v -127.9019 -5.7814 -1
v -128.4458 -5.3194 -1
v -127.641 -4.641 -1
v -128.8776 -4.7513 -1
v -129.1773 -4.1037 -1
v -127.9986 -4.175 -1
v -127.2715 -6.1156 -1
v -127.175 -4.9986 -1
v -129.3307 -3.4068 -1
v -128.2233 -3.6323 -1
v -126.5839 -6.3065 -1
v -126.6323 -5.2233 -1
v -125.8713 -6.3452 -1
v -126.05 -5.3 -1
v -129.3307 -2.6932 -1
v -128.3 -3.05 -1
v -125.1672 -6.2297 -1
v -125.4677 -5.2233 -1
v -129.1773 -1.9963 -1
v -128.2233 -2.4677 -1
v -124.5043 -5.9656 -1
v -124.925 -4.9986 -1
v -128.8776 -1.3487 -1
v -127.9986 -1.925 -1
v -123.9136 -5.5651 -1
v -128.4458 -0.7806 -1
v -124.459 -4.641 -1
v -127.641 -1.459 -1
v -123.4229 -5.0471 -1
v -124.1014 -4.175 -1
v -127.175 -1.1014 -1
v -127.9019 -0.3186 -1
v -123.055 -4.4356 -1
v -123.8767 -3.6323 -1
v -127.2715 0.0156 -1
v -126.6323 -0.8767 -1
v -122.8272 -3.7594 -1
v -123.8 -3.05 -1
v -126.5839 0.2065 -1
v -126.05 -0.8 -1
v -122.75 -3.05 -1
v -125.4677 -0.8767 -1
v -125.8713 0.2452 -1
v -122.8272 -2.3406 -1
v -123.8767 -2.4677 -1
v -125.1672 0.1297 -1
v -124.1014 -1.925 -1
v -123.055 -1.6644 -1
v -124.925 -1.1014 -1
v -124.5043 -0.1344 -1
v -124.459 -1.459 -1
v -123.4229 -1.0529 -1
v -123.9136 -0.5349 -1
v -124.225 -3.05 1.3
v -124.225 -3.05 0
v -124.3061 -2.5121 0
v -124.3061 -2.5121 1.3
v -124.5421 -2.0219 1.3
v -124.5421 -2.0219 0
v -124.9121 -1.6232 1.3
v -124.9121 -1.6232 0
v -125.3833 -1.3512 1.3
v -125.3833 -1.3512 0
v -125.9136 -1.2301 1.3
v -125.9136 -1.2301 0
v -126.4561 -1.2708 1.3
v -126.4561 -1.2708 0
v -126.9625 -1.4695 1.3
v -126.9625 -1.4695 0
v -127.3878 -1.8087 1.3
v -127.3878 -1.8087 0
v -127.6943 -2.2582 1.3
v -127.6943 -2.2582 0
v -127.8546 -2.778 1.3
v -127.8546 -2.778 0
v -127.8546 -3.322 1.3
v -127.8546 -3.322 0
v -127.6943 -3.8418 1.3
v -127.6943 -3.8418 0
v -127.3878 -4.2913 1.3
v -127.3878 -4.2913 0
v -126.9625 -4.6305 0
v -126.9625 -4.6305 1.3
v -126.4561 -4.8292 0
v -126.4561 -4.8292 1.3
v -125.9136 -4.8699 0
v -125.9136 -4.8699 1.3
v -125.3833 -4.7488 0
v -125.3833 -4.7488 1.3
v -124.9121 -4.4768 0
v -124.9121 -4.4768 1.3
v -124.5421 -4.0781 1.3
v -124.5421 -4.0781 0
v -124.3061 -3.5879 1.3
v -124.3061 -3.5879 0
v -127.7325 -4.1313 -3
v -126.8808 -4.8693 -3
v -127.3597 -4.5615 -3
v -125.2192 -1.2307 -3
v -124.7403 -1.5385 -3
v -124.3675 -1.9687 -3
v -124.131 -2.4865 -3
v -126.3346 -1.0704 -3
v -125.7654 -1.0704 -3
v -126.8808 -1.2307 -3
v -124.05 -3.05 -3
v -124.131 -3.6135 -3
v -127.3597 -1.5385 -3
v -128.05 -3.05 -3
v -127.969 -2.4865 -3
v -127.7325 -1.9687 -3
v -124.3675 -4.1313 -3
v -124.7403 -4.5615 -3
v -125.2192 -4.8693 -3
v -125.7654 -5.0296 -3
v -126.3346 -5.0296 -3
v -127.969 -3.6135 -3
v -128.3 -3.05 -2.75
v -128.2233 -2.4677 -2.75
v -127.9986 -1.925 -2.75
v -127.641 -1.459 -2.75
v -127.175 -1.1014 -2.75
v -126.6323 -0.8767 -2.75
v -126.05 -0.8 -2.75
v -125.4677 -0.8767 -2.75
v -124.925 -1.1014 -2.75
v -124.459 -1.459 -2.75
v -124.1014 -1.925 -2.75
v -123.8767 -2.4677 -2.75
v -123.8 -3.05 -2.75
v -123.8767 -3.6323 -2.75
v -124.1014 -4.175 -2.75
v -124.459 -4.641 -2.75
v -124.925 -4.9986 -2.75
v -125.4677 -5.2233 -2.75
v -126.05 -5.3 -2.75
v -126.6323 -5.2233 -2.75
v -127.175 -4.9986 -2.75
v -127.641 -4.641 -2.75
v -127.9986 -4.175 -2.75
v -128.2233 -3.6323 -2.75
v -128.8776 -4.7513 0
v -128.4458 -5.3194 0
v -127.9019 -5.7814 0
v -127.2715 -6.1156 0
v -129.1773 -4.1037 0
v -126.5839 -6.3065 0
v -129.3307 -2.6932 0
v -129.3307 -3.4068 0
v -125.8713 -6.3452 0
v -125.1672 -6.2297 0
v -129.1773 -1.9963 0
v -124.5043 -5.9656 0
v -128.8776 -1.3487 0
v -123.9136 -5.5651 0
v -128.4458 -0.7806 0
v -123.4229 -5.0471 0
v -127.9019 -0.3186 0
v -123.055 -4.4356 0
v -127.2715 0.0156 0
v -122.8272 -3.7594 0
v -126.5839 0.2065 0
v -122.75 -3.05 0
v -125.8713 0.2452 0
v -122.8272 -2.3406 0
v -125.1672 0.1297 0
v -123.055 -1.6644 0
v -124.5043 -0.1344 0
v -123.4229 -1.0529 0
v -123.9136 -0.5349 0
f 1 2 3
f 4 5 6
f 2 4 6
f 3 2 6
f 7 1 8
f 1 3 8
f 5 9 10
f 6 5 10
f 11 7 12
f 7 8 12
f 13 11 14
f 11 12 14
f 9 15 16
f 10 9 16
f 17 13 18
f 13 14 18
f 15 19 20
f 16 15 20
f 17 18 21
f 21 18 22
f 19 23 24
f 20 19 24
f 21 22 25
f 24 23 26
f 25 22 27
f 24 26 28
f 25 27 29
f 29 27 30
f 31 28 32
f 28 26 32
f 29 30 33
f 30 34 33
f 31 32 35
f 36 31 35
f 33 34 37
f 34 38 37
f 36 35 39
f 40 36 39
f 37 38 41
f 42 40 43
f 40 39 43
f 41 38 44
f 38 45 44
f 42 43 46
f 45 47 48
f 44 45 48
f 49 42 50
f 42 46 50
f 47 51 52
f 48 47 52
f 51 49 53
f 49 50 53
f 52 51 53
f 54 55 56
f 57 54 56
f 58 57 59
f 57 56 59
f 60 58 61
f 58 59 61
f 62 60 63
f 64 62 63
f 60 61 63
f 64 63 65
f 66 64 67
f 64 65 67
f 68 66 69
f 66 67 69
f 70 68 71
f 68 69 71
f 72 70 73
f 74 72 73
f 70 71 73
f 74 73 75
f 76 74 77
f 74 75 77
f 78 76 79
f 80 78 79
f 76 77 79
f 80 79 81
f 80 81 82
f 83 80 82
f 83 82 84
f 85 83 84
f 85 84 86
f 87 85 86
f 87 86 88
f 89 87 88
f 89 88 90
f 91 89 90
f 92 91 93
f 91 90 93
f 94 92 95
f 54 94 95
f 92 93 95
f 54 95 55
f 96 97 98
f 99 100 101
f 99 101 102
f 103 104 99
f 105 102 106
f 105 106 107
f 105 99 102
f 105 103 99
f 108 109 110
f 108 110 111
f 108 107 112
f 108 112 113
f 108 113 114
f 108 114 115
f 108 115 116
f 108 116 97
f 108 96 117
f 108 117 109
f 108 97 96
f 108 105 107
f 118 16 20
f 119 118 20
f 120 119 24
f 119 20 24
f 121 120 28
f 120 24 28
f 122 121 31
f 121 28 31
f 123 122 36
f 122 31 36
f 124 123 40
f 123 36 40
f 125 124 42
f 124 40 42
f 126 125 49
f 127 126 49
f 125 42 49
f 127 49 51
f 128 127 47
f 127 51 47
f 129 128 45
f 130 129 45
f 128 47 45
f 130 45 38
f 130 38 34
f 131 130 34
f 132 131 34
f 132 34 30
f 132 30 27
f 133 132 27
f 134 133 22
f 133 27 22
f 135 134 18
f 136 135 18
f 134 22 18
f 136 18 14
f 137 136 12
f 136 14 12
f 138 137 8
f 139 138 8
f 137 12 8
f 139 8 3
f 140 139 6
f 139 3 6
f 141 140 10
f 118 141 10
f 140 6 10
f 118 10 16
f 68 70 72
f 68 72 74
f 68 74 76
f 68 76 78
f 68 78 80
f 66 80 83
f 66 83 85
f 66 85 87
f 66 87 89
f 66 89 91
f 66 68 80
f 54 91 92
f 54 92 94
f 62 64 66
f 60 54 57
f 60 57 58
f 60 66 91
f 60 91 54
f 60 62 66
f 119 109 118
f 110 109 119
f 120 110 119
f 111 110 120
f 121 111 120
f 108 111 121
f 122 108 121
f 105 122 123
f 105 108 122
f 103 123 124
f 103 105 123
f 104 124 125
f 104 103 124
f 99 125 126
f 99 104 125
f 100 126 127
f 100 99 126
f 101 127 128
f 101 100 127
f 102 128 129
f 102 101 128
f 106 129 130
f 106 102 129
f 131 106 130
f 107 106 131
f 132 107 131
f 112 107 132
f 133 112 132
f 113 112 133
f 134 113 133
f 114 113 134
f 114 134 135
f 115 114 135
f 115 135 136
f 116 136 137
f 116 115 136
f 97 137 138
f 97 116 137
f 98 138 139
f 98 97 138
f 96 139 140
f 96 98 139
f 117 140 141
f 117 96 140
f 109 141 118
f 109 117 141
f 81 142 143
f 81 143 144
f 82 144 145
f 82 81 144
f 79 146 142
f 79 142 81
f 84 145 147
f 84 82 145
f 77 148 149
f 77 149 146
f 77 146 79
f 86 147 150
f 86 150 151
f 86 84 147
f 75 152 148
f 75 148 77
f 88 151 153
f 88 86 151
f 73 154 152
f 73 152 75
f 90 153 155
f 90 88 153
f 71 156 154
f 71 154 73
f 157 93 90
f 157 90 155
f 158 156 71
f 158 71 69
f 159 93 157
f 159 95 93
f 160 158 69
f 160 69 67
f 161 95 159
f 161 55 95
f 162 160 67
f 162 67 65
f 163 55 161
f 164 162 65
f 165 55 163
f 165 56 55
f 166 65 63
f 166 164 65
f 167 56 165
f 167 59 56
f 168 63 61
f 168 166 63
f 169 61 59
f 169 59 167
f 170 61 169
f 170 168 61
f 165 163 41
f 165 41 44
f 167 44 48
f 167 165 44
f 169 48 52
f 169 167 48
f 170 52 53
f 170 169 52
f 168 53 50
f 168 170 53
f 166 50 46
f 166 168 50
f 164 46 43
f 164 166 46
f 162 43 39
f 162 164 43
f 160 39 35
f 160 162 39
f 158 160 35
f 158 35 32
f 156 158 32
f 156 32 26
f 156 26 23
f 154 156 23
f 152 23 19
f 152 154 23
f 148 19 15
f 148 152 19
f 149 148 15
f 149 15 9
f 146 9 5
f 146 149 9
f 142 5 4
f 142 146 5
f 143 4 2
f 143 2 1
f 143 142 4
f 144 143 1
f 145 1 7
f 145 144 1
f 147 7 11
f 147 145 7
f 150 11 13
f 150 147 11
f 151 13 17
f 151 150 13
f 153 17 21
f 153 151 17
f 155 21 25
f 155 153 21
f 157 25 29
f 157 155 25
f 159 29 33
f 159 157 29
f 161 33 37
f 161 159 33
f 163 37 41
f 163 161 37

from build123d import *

# Parameters (mm, degrees)
SKETCH1_R           = 3.3
BOSS_EXTRUDE2_DEPTH = 1
SKETCH4_R           = 2.25
BOSS_EXTRUDE3_DEPTH = 2
CHAMFER4_SIZE       = 0.25
SKETCH5_R           = 1.825
BOSS_EXTRUDE4_DEPTH = 1.3


with BuildPart() as part:
    # Sketch1 → Boss-Extrude2 (new body)
    with BuildSketch(Plane.XY):
        with Locations((-126.049999999, -3.05)):
            Circle(SKETCH1_R)
    extrude(amount=-BOSS_EXTRUDE2_DEPTH)

    # Sketch4 → Boss-Extrude3 (add)
    with BuildSketch(Plane(origin=(0, 0, -1), x_dir=(-1, 0, 0), z_dir=(0, 0, -1))):
        with Locations((126.049999999, -3.05)):
            Circle(SKETCH4_R)
    extrude(amount=BOSS_EXTRUDE3_DEPTH)

    # Chamfer4
    chamfer4_edges = [part.edges().sort_by_distance(p)[0] for p in [
        (-123.799999999, -3.05, -3),
    ]]
    chamfer(chamfer4_edges, length=CHAMFER4_SIZE)

    # Sketch5 → Boss-Extrude4 (add)
    with BuildSketch(Plane.XY):
        with Locations((-126.049999999, -3.05)):
            Circle(SKETCH5_R)
    extrude(amount=BOSS_EXTRUDE4_DEPTH)


solid = part.part
